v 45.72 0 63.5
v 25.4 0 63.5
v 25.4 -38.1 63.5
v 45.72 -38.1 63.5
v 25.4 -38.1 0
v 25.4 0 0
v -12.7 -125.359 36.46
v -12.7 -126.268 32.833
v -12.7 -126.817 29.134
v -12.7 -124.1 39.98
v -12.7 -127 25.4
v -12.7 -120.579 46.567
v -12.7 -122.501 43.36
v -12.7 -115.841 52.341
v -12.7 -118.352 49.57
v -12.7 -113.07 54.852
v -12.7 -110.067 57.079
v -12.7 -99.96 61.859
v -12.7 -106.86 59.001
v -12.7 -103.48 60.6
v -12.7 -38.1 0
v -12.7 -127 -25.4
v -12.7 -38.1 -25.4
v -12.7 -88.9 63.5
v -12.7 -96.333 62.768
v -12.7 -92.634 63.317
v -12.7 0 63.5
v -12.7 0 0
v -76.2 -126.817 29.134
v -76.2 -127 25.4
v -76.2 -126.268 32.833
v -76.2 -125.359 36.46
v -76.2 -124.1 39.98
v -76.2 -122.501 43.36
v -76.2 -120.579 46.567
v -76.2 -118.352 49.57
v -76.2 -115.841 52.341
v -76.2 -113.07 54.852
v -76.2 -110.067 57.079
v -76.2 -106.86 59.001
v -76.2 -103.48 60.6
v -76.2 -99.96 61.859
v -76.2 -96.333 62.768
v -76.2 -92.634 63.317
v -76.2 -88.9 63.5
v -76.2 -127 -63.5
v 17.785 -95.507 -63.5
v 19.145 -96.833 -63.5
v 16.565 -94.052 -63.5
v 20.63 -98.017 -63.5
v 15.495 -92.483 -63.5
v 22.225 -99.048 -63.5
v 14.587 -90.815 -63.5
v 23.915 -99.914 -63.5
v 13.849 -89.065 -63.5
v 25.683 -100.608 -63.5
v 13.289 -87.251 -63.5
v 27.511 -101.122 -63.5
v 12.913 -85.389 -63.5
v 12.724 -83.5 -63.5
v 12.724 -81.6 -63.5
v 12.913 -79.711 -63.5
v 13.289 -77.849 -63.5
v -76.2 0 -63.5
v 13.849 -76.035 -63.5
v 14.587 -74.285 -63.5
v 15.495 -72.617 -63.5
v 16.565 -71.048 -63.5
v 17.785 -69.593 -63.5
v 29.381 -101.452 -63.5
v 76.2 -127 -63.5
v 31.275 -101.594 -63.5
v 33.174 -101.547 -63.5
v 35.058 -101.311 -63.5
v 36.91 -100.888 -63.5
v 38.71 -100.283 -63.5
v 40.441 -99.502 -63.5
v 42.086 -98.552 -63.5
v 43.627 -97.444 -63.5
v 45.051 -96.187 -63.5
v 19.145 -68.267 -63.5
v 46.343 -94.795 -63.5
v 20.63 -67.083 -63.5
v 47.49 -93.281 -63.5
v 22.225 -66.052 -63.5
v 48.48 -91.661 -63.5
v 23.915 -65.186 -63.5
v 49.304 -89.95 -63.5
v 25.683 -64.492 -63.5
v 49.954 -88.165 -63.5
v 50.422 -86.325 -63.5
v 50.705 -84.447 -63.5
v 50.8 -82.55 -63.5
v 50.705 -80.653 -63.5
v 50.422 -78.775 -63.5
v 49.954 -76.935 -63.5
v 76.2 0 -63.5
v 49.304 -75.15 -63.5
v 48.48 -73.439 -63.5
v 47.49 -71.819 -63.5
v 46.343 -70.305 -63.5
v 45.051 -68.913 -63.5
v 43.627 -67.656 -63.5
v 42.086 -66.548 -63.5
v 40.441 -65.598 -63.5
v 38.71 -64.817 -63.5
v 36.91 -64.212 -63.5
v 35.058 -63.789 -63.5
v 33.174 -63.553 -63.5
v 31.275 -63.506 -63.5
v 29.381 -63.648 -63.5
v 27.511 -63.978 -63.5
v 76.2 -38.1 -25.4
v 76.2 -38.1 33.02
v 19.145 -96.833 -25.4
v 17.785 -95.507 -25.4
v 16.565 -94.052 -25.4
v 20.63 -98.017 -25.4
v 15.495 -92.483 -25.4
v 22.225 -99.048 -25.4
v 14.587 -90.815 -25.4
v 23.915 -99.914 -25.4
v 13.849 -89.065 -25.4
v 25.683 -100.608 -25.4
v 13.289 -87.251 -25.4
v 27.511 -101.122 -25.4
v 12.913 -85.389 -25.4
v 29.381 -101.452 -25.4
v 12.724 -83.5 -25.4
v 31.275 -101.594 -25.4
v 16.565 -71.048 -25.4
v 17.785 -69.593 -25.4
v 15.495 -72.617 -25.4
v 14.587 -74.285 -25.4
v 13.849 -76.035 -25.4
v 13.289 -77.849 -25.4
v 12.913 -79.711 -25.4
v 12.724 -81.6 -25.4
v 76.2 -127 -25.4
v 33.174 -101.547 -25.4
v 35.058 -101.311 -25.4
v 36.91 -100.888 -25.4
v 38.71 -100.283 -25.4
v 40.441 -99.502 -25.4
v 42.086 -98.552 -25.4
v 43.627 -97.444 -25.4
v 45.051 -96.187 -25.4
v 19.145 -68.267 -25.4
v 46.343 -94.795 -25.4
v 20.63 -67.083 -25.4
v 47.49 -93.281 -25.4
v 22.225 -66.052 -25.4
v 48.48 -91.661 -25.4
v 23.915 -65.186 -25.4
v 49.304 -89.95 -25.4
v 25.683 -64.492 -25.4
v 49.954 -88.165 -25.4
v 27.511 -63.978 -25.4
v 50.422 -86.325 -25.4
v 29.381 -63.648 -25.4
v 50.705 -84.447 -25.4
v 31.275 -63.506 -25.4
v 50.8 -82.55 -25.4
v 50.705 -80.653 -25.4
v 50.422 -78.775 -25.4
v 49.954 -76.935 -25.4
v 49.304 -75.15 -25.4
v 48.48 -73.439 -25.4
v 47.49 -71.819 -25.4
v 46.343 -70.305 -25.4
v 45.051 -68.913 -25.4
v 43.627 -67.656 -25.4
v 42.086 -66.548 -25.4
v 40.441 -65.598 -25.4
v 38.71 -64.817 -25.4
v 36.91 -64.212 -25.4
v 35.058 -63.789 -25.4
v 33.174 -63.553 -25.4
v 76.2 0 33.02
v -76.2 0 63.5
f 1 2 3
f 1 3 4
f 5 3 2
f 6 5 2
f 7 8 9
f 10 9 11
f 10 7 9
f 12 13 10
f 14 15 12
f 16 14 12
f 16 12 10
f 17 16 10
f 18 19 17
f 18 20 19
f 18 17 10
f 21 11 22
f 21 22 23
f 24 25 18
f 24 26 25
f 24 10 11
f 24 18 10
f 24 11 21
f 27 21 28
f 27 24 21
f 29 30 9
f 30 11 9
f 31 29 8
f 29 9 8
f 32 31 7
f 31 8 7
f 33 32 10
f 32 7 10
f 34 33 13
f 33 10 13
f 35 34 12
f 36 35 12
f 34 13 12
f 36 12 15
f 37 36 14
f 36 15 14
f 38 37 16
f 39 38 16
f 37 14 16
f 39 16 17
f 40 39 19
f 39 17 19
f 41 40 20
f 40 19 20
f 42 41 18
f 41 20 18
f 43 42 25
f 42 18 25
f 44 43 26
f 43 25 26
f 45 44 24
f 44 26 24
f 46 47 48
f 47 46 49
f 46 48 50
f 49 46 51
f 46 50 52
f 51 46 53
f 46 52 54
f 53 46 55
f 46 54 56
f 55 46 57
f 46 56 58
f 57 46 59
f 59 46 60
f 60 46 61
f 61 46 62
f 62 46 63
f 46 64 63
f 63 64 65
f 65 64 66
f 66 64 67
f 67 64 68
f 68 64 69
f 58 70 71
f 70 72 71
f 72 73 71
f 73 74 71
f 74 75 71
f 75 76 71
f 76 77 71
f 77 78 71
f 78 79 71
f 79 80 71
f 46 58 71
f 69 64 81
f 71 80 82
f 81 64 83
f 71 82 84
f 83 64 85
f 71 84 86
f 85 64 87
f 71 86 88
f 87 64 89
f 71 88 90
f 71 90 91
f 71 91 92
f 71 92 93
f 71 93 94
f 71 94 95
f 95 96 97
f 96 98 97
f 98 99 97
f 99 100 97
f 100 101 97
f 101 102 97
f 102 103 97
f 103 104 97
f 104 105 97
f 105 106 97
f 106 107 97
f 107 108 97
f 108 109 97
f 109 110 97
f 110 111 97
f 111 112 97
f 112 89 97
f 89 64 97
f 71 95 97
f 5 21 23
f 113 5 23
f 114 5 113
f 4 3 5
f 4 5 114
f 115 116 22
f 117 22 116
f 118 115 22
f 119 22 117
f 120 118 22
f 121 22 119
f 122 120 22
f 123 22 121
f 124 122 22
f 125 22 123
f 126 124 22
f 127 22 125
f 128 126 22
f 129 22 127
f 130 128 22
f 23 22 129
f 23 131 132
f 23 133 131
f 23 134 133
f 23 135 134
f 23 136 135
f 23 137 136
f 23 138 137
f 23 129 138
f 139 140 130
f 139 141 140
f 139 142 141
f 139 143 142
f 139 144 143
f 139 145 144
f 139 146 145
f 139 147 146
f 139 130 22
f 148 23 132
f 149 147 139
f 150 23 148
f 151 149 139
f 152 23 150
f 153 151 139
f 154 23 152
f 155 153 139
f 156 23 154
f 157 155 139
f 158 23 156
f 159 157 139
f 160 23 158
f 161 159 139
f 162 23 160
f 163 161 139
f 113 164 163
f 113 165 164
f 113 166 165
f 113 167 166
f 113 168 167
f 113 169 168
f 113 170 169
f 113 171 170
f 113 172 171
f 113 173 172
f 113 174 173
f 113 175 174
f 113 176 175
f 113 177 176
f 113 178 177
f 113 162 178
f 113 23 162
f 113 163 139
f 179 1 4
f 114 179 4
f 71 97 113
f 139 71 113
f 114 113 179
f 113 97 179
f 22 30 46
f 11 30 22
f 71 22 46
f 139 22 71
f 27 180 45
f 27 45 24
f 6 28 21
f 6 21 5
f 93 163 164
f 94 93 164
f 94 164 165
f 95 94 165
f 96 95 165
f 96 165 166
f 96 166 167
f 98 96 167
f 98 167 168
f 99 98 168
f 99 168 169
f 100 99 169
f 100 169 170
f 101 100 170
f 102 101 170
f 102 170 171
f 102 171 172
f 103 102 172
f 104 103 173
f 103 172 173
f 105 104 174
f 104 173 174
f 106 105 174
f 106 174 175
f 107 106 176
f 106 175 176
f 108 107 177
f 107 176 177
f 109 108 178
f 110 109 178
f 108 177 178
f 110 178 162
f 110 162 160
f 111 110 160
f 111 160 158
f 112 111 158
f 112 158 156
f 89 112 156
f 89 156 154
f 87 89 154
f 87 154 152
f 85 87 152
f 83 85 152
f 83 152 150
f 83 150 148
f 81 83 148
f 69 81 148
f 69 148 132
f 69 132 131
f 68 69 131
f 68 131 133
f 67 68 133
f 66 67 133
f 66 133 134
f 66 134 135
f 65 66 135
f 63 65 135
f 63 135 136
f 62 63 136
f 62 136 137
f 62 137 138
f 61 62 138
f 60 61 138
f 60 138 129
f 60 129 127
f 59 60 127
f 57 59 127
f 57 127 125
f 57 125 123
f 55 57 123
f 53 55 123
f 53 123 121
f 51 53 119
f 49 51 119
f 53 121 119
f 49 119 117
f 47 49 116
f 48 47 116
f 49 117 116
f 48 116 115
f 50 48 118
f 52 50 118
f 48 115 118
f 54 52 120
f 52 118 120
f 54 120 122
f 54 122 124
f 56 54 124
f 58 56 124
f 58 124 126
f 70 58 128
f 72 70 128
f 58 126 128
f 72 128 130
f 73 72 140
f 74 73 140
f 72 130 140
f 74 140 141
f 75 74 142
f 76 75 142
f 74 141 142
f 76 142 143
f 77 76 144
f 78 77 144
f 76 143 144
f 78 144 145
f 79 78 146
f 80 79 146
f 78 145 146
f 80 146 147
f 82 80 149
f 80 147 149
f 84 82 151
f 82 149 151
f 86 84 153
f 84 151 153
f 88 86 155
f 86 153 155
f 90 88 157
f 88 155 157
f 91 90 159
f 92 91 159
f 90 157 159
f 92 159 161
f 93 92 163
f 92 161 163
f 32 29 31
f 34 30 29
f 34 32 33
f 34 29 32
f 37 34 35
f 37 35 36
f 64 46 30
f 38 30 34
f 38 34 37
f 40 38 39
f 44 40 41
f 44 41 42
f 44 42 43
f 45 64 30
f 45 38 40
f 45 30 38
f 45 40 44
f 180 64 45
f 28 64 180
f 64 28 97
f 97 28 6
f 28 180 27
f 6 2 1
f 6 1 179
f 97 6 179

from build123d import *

# Parameters (mm, degrees)
F0_W     = 152.4
F0_H     = 127
F1_DEPTH = 127
F2_W     = 88.9
F2_H     = 88.9
F3_DEPTH = 88.9
F4_R     = 19.05
F5_DEPTH = 50.8
F6_W     = 38.1
F6_H     = 38.1
F7_DEPTH = 63.5
F8_SIZE  = 30.48
F9_R     = 38.1


with BuildPart() as f1:
    # F0 (on Front) → F1 (new body)
    with BuildSketch(Plane.XZ):
        Rectangle(F0_W, F0_H)
    extrude(amount=F1_DEPTH)

    # F2 (on face) → F3 (cut)
    with BuildSketch(Plane.XY.offset(63.5)):
        with Locations((31.75, -82.55)):
            Rectangle(F2_W, F2_H)
    extrude(amount=-F3_DEPTH, mode=Mode.SUBTRACT)

    # F4 (on face) → F5 (cut)
    with BuildSketch(Plane.XY.offset(-25.4)):
        with Locations((31.75, -82.55)):
            Circle(F4_R)
    extrude(amount=-F5_DEPTH, mode=Mode.SUBTRACT)

    # F6 (on face) → F7 (cut)
    with BuildSketch(Plane.XY.offset(63.5)):
        with Locations((6.35, -19.05)):
            Rectangle(F6_W, F6_H)
    extrude(amount=-F7_DEPTH, mode=Mode.SUBTRACT)

    # F8
    f8_edges = [f1.edges().sort_by_distance(p)[0] for p in [
        (76.2, -19.05, 63.5),
    ]]
    chamfer(f8_edges, length=F8_SIZE)

    # F9
    f9_edges = [f1.edges().sort_by_distance(p)[0] for p in [
        (-44.45, -127, 63.5),
    ]]
    fillet(f9_edges, radius=F9_R)


solid = f1.part
